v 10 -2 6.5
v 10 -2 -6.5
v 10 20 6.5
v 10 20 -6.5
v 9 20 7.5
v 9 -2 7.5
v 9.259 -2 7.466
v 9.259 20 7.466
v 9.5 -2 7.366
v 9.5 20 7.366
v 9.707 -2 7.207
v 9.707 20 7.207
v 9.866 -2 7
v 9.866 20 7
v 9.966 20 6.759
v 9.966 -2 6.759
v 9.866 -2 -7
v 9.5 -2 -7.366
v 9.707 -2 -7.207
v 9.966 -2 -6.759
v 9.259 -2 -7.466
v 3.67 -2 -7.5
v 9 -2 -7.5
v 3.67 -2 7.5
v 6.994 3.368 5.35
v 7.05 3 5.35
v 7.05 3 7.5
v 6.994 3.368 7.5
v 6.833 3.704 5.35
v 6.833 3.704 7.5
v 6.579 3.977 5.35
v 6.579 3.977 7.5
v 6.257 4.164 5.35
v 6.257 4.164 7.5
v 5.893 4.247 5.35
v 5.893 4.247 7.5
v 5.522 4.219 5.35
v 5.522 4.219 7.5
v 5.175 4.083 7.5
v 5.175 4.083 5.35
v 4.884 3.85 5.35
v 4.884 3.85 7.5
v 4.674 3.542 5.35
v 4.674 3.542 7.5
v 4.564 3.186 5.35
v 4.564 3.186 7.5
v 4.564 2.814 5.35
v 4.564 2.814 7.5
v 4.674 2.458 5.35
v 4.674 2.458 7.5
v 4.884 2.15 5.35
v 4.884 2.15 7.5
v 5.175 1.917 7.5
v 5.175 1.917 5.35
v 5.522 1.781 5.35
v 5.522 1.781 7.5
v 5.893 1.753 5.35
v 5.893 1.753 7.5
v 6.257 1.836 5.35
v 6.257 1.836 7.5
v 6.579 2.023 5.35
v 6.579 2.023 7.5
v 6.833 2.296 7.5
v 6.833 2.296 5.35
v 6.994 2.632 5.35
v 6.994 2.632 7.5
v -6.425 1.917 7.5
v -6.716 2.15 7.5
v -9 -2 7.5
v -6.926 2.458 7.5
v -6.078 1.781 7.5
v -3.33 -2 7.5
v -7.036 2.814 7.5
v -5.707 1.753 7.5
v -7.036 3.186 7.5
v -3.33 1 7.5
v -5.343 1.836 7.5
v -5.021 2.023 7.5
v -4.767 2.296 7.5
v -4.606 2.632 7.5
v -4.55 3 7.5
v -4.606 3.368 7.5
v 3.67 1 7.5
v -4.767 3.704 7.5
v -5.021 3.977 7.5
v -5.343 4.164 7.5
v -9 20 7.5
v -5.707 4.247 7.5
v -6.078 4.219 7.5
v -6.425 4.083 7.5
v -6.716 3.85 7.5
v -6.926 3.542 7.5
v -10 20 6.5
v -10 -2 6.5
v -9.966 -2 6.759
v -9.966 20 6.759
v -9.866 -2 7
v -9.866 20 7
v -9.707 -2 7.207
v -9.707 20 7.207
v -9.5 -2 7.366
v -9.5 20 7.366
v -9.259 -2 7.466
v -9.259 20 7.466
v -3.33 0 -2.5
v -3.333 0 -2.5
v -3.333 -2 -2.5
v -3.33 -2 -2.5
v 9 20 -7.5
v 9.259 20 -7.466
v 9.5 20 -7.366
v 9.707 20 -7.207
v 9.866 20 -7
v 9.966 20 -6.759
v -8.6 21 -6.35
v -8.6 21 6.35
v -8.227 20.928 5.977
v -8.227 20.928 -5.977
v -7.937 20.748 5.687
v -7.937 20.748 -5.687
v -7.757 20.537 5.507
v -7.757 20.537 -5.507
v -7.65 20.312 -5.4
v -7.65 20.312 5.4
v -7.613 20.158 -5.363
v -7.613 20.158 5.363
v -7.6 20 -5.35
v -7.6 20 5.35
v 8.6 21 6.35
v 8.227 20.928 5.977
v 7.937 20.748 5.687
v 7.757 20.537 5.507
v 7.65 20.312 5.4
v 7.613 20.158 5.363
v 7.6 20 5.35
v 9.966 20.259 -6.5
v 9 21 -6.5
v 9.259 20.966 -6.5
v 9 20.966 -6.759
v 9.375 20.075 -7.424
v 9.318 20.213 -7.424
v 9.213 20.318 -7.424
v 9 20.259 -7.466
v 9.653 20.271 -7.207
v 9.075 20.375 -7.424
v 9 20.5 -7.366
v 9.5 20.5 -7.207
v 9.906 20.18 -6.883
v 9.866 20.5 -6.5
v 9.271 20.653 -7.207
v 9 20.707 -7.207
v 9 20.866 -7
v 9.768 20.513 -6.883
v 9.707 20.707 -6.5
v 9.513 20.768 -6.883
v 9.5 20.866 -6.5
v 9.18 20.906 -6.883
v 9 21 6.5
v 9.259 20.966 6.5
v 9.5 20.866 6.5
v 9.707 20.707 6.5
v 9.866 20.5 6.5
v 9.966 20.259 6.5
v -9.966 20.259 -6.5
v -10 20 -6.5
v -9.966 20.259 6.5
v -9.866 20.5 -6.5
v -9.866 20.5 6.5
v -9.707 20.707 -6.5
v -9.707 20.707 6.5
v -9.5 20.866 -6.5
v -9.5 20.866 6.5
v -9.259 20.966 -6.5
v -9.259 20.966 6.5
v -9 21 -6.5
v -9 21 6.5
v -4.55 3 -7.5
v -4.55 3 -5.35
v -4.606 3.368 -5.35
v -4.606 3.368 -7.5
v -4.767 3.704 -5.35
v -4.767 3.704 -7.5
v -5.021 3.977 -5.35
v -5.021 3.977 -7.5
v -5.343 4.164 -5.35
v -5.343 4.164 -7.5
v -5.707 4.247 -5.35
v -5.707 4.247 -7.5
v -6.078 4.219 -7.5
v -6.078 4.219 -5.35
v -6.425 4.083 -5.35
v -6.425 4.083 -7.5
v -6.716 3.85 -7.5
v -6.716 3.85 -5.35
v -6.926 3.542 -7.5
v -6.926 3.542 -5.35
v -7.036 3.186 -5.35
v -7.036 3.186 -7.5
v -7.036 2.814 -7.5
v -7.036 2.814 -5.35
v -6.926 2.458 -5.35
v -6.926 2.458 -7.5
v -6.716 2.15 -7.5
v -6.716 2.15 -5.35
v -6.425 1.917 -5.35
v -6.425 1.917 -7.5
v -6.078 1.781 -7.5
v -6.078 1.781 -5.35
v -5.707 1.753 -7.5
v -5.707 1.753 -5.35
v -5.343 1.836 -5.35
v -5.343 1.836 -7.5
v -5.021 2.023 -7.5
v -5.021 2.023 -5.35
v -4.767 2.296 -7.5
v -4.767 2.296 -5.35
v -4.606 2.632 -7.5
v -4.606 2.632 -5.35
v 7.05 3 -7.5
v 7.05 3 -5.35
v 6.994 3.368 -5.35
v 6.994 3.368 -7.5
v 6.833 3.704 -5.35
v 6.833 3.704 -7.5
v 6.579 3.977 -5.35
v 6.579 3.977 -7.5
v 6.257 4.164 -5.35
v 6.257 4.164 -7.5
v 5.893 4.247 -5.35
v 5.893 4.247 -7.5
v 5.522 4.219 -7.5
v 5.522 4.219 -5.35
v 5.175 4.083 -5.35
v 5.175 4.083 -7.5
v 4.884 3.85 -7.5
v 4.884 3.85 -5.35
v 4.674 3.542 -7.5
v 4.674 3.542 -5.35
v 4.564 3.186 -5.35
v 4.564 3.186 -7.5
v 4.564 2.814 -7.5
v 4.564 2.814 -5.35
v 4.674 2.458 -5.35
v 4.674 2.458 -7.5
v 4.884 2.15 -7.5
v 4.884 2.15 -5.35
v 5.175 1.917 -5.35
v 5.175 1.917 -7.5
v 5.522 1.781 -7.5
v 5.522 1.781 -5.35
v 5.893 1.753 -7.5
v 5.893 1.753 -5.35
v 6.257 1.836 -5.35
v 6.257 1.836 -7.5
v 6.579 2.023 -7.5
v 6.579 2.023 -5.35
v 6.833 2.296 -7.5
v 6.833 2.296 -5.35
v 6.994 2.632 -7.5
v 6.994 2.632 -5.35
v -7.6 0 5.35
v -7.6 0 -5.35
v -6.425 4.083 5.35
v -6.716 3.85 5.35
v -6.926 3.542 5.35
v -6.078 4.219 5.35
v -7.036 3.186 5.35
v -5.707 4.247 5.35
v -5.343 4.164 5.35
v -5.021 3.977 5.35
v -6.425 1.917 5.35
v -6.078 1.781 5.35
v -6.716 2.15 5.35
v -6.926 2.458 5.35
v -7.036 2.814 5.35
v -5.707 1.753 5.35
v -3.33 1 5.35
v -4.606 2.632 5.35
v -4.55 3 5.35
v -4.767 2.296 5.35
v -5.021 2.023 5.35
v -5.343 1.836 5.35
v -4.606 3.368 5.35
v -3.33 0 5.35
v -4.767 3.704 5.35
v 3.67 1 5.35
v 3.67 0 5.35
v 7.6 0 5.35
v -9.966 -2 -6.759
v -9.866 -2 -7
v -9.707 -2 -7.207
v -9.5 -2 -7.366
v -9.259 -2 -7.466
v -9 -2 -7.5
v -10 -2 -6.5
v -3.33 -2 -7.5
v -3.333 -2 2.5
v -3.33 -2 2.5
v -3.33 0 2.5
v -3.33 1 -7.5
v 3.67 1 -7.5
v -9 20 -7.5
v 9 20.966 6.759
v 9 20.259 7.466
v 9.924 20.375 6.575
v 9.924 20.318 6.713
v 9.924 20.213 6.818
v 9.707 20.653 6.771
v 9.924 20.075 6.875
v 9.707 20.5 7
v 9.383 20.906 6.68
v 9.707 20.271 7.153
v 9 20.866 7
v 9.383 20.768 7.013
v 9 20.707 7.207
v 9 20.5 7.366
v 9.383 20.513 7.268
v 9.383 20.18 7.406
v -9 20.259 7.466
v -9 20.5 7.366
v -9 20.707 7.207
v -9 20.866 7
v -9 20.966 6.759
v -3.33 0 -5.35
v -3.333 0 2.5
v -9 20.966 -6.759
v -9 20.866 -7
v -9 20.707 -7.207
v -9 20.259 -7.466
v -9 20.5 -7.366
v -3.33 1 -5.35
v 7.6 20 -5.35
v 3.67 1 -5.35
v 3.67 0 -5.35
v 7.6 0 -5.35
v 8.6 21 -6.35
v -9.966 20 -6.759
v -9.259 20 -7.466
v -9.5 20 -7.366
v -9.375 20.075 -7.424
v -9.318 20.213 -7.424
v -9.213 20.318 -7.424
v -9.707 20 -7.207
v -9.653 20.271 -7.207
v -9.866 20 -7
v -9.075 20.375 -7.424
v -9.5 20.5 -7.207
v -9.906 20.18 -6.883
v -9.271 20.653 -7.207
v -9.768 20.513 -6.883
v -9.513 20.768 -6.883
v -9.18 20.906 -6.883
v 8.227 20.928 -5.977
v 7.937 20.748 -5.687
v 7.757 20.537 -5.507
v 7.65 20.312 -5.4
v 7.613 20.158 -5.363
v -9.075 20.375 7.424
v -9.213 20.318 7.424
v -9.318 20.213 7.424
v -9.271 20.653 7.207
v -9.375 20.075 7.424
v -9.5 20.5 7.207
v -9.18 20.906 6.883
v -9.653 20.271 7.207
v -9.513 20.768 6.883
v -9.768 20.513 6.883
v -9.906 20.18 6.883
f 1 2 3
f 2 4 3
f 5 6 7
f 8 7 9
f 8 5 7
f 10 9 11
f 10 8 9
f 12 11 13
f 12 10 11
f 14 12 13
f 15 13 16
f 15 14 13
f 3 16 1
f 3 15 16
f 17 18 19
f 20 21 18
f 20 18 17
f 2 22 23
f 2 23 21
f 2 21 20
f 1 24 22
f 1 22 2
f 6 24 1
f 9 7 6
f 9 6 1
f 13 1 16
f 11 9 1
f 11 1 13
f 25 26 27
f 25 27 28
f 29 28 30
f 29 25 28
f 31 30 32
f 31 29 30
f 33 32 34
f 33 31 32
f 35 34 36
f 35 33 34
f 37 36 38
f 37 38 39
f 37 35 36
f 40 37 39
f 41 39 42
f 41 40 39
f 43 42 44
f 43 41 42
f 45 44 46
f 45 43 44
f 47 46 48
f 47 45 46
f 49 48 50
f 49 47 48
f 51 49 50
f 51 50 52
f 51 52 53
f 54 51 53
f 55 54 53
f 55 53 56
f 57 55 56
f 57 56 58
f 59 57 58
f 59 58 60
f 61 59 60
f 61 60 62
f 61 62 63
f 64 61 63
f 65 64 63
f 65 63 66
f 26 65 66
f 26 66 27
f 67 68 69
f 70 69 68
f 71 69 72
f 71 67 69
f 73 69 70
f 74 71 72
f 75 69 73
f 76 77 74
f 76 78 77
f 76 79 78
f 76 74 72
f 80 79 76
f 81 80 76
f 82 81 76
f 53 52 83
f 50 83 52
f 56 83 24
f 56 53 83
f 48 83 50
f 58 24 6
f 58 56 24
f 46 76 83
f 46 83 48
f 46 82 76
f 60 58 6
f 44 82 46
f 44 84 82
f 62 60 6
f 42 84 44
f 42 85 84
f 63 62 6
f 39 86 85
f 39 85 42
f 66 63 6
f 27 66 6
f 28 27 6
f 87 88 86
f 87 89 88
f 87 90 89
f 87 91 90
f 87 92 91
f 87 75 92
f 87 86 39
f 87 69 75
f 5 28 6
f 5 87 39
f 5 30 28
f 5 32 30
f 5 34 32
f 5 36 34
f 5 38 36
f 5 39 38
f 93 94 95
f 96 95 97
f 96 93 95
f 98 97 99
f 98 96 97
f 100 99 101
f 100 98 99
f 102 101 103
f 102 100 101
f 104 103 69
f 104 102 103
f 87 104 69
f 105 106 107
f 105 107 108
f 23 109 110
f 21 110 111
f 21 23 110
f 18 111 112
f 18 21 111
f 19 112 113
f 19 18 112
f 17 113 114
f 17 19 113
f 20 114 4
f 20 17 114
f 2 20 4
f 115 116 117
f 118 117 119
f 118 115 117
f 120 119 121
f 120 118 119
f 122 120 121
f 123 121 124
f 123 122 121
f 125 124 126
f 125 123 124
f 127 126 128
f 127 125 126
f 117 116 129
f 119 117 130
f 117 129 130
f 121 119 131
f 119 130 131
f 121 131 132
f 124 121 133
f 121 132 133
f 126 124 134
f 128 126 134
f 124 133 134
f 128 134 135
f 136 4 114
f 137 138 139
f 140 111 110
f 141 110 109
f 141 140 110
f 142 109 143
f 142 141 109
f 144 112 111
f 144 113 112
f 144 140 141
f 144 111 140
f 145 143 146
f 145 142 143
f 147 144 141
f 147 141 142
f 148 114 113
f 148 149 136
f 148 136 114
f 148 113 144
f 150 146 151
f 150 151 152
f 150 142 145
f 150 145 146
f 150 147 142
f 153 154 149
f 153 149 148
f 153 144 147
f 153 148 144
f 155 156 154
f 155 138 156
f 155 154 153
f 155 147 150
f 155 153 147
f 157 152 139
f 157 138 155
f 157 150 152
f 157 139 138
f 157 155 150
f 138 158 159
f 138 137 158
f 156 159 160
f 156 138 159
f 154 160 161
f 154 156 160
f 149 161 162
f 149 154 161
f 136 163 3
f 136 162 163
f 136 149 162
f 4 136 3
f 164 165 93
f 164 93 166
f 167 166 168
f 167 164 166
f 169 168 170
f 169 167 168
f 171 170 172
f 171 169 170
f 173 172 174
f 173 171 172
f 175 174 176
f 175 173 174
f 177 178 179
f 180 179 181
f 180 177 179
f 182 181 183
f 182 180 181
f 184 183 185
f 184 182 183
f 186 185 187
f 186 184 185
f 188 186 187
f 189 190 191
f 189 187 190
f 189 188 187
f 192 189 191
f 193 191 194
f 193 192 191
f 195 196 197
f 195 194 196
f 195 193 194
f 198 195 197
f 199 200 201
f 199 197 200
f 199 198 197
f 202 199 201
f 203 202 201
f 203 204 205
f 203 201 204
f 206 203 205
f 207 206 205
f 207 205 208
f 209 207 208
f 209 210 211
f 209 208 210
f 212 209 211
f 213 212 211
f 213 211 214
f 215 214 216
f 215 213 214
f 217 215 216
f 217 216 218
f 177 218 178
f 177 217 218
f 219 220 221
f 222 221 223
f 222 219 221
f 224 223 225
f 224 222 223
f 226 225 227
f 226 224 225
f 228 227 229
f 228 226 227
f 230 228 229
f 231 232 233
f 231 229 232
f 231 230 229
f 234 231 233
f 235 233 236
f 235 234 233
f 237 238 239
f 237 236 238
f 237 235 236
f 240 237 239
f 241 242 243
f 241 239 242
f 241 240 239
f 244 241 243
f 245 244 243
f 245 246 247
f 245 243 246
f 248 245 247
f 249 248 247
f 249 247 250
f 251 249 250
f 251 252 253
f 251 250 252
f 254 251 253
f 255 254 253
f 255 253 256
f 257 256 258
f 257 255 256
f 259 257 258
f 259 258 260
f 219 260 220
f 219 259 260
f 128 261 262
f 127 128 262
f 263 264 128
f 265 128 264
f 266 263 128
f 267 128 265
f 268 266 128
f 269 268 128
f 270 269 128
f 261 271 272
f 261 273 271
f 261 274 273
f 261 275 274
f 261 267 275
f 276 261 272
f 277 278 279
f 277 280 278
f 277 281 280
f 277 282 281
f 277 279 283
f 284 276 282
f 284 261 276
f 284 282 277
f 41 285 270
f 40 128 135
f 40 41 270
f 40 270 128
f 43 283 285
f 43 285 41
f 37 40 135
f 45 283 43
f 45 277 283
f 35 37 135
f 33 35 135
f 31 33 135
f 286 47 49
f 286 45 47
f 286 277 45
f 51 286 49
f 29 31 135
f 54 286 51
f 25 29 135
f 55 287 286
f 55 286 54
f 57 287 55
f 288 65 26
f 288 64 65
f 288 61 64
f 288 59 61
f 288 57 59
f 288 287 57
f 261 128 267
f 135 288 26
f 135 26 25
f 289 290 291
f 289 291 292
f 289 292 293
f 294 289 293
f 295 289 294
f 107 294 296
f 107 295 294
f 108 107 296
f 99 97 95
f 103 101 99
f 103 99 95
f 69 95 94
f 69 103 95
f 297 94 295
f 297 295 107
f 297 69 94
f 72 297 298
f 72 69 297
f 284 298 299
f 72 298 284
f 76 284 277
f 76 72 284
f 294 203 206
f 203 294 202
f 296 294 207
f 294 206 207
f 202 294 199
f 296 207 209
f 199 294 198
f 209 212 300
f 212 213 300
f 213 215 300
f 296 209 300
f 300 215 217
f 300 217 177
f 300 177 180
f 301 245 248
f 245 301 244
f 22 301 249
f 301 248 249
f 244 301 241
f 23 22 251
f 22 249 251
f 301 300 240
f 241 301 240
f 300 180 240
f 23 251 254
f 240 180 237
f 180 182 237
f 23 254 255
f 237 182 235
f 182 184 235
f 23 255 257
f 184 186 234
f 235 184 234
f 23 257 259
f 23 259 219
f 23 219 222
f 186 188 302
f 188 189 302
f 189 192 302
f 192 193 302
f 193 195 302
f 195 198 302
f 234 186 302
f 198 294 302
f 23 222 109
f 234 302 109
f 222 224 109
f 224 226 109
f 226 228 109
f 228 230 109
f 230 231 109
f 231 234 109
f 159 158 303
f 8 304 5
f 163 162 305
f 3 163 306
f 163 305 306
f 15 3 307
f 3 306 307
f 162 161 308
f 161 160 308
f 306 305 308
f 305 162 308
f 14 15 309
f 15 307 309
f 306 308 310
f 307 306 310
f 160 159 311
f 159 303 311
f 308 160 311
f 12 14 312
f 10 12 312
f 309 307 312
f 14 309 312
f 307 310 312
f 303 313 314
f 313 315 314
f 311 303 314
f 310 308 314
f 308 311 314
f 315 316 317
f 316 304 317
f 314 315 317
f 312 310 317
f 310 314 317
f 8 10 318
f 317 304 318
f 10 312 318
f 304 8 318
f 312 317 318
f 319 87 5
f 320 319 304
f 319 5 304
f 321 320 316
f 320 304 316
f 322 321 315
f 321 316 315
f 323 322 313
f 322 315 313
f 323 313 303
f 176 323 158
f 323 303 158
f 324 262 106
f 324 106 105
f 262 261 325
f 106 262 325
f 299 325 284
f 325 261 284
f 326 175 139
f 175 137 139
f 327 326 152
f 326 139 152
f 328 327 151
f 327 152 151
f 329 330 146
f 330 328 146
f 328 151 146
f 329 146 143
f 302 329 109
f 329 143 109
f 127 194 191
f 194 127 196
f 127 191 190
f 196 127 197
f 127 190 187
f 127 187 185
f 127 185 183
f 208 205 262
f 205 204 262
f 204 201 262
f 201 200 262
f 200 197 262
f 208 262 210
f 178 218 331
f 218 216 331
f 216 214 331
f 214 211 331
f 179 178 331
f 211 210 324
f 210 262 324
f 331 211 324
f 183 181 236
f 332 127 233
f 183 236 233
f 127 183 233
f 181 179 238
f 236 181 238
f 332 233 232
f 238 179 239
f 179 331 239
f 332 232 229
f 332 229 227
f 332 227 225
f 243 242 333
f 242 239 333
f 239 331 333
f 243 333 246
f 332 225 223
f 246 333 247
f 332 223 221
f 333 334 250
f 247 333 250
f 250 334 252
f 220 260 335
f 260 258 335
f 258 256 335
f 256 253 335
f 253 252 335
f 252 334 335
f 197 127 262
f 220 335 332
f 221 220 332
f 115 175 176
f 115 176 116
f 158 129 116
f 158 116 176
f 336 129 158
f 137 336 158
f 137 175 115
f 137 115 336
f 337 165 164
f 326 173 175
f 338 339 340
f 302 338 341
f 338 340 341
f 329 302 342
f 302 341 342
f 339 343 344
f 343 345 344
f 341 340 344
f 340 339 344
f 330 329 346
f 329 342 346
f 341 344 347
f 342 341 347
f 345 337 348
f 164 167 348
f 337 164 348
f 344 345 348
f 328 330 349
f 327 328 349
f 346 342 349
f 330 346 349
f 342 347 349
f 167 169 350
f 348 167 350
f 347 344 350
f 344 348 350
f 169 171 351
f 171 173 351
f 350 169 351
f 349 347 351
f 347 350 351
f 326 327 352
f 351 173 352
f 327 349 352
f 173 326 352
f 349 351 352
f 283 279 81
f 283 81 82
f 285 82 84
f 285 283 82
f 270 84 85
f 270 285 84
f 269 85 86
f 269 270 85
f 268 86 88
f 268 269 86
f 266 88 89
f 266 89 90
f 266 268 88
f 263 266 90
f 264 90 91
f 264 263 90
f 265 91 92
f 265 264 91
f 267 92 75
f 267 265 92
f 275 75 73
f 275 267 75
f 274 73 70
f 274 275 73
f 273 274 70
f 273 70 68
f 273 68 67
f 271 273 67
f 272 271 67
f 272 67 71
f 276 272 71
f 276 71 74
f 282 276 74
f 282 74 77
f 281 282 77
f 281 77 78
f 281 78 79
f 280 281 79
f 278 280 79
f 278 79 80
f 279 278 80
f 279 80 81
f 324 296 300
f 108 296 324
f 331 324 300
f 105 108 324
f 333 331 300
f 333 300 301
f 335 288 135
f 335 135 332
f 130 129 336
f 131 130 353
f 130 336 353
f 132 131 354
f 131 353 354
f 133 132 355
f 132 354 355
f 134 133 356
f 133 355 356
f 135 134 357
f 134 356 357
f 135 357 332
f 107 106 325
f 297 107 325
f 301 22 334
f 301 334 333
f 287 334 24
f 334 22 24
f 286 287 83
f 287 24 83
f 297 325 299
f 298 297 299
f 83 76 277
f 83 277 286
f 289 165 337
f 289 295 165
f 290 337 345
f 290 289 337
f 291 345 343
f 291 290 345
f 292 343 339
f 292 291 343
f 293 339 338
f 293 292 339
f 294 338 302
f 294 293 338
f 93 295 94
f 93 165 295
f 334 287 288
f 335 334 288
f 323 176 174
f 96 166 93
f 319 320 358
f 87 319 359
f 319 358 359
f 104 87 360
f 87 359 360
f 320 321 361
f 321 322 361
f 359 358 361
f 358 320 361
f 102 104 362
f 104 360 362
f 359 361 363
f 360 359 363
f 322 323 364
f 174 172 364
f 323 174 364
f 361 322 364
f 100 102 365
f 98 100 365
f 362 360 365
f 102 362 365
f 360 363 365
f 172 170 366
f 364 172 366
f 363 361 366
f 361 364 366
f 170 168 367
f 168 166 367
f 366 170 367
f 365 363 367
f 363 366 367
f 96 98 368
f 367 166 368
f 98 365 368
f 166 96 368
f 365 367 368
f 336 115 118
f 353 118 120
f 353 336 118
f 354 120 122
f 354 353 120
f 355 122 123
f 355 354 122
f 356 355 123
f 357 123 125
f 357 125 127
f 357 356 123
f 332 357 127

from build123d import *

# Parameters (mm, degrees)
SKETCH1_W           = 20
SKETCH1_H           = 15
SKETCH1_W_2         = 15.2
SKETCH1_H_2         = 10.7
BOSS_EXTRUDE1_DEPTH = 21
SKETCH2_W           = 20
SKETCH2_H           = 15
SKETCH2_W_2         = 6.666666666
SKETCH2_H_2         = 5
BOSS_EXTRUDE2_DEPTH = 2
HOLE1_START         = -7.5
HOLE1_OUTLINE_R     = 1.25
HOLE1_DEPTH         = 15
FILLET1_R           = 1
SKETCH4_W           = 7
SKETCH4_H           = 3
CUT_EXTRUDE1_DEPTH  = 28.676705006


# Read off the part's stored shape, not the designer's step: Hole1
with BuildPart() as part:
    # Sketch1 → Boss-Extrude1 (new body)
    with BuildSketch(Plane(origin=(0, 0, 0), x_dir=(1, 0, 0), z_dir=(0, 1, 0))):
        Rectangle(SKETCH1_W, SKETCH1_H)
        Rectangle(SKETCH1_W_2, SKETCH1_H_2, mode=Mode.SUBTRACT)
    extrude(amount=BOSS_EXTRUDE1_DEPTH)

    # Sketch2 → Boss-Extrude2 (add)
    with BuildSketch(Plane.XZ):
        Rectangle(SKETCH2_W, SKETCH2_H)
        Rectangle(SKETCH2_W_2, SKETCH2_H_2, mode=Mode.SUBTRACT)
    extrude(amount=BOSS_EXTRUDE2_DEPTH)

    # Hole1 outline → Hole1 (cut)
    with BuildSketch(Plane.XY.offset(HOLE1_START)):
        with Locations((5.8, 3)):
            Circle(HOLE1_OUTLINE_R)
        with Locations((-5.8, 3)):
            Circle(HOLE1_OUTLINE_R)
    extrude(amount=HOLE1_DEPTH, mode=Mode.SUBTRACT)

    # Fillet1
    fillet1_edges = [part.edges().sort_by_distance(p)[0] for p in [
        (-10, 21, 0),
        (7.6, 21, 0),
        (0, 21, 7.5),
        (0, 21, -5.35),
        (-7.6, 21, 0),
        (0, 21, 5.35),
        (10, 21, 0),
        (10, 9.5, 7.5),
        (-10, 9.5, 7.5),
        (-10, 9.5, -7.5),
        (10, 9.5, -7.5),
        (0, 21, -7.5),
    ]]
    fillet(fillet1_edges, radius=FILLET1_R)

    # Sketch4 → Cut-Extrude1 (cut, through all)
    with BuildSketch(Plane.XY.offset(7.5)):
        with Locations((0.17, -0.5)):
            Rectangle(SKETCH4_W, SKETCH4_H)
    extrude(amount=-CUT_EXTRUDE1_DEPTH, mode=Mode.SUBTRACT)


solid = part.part
